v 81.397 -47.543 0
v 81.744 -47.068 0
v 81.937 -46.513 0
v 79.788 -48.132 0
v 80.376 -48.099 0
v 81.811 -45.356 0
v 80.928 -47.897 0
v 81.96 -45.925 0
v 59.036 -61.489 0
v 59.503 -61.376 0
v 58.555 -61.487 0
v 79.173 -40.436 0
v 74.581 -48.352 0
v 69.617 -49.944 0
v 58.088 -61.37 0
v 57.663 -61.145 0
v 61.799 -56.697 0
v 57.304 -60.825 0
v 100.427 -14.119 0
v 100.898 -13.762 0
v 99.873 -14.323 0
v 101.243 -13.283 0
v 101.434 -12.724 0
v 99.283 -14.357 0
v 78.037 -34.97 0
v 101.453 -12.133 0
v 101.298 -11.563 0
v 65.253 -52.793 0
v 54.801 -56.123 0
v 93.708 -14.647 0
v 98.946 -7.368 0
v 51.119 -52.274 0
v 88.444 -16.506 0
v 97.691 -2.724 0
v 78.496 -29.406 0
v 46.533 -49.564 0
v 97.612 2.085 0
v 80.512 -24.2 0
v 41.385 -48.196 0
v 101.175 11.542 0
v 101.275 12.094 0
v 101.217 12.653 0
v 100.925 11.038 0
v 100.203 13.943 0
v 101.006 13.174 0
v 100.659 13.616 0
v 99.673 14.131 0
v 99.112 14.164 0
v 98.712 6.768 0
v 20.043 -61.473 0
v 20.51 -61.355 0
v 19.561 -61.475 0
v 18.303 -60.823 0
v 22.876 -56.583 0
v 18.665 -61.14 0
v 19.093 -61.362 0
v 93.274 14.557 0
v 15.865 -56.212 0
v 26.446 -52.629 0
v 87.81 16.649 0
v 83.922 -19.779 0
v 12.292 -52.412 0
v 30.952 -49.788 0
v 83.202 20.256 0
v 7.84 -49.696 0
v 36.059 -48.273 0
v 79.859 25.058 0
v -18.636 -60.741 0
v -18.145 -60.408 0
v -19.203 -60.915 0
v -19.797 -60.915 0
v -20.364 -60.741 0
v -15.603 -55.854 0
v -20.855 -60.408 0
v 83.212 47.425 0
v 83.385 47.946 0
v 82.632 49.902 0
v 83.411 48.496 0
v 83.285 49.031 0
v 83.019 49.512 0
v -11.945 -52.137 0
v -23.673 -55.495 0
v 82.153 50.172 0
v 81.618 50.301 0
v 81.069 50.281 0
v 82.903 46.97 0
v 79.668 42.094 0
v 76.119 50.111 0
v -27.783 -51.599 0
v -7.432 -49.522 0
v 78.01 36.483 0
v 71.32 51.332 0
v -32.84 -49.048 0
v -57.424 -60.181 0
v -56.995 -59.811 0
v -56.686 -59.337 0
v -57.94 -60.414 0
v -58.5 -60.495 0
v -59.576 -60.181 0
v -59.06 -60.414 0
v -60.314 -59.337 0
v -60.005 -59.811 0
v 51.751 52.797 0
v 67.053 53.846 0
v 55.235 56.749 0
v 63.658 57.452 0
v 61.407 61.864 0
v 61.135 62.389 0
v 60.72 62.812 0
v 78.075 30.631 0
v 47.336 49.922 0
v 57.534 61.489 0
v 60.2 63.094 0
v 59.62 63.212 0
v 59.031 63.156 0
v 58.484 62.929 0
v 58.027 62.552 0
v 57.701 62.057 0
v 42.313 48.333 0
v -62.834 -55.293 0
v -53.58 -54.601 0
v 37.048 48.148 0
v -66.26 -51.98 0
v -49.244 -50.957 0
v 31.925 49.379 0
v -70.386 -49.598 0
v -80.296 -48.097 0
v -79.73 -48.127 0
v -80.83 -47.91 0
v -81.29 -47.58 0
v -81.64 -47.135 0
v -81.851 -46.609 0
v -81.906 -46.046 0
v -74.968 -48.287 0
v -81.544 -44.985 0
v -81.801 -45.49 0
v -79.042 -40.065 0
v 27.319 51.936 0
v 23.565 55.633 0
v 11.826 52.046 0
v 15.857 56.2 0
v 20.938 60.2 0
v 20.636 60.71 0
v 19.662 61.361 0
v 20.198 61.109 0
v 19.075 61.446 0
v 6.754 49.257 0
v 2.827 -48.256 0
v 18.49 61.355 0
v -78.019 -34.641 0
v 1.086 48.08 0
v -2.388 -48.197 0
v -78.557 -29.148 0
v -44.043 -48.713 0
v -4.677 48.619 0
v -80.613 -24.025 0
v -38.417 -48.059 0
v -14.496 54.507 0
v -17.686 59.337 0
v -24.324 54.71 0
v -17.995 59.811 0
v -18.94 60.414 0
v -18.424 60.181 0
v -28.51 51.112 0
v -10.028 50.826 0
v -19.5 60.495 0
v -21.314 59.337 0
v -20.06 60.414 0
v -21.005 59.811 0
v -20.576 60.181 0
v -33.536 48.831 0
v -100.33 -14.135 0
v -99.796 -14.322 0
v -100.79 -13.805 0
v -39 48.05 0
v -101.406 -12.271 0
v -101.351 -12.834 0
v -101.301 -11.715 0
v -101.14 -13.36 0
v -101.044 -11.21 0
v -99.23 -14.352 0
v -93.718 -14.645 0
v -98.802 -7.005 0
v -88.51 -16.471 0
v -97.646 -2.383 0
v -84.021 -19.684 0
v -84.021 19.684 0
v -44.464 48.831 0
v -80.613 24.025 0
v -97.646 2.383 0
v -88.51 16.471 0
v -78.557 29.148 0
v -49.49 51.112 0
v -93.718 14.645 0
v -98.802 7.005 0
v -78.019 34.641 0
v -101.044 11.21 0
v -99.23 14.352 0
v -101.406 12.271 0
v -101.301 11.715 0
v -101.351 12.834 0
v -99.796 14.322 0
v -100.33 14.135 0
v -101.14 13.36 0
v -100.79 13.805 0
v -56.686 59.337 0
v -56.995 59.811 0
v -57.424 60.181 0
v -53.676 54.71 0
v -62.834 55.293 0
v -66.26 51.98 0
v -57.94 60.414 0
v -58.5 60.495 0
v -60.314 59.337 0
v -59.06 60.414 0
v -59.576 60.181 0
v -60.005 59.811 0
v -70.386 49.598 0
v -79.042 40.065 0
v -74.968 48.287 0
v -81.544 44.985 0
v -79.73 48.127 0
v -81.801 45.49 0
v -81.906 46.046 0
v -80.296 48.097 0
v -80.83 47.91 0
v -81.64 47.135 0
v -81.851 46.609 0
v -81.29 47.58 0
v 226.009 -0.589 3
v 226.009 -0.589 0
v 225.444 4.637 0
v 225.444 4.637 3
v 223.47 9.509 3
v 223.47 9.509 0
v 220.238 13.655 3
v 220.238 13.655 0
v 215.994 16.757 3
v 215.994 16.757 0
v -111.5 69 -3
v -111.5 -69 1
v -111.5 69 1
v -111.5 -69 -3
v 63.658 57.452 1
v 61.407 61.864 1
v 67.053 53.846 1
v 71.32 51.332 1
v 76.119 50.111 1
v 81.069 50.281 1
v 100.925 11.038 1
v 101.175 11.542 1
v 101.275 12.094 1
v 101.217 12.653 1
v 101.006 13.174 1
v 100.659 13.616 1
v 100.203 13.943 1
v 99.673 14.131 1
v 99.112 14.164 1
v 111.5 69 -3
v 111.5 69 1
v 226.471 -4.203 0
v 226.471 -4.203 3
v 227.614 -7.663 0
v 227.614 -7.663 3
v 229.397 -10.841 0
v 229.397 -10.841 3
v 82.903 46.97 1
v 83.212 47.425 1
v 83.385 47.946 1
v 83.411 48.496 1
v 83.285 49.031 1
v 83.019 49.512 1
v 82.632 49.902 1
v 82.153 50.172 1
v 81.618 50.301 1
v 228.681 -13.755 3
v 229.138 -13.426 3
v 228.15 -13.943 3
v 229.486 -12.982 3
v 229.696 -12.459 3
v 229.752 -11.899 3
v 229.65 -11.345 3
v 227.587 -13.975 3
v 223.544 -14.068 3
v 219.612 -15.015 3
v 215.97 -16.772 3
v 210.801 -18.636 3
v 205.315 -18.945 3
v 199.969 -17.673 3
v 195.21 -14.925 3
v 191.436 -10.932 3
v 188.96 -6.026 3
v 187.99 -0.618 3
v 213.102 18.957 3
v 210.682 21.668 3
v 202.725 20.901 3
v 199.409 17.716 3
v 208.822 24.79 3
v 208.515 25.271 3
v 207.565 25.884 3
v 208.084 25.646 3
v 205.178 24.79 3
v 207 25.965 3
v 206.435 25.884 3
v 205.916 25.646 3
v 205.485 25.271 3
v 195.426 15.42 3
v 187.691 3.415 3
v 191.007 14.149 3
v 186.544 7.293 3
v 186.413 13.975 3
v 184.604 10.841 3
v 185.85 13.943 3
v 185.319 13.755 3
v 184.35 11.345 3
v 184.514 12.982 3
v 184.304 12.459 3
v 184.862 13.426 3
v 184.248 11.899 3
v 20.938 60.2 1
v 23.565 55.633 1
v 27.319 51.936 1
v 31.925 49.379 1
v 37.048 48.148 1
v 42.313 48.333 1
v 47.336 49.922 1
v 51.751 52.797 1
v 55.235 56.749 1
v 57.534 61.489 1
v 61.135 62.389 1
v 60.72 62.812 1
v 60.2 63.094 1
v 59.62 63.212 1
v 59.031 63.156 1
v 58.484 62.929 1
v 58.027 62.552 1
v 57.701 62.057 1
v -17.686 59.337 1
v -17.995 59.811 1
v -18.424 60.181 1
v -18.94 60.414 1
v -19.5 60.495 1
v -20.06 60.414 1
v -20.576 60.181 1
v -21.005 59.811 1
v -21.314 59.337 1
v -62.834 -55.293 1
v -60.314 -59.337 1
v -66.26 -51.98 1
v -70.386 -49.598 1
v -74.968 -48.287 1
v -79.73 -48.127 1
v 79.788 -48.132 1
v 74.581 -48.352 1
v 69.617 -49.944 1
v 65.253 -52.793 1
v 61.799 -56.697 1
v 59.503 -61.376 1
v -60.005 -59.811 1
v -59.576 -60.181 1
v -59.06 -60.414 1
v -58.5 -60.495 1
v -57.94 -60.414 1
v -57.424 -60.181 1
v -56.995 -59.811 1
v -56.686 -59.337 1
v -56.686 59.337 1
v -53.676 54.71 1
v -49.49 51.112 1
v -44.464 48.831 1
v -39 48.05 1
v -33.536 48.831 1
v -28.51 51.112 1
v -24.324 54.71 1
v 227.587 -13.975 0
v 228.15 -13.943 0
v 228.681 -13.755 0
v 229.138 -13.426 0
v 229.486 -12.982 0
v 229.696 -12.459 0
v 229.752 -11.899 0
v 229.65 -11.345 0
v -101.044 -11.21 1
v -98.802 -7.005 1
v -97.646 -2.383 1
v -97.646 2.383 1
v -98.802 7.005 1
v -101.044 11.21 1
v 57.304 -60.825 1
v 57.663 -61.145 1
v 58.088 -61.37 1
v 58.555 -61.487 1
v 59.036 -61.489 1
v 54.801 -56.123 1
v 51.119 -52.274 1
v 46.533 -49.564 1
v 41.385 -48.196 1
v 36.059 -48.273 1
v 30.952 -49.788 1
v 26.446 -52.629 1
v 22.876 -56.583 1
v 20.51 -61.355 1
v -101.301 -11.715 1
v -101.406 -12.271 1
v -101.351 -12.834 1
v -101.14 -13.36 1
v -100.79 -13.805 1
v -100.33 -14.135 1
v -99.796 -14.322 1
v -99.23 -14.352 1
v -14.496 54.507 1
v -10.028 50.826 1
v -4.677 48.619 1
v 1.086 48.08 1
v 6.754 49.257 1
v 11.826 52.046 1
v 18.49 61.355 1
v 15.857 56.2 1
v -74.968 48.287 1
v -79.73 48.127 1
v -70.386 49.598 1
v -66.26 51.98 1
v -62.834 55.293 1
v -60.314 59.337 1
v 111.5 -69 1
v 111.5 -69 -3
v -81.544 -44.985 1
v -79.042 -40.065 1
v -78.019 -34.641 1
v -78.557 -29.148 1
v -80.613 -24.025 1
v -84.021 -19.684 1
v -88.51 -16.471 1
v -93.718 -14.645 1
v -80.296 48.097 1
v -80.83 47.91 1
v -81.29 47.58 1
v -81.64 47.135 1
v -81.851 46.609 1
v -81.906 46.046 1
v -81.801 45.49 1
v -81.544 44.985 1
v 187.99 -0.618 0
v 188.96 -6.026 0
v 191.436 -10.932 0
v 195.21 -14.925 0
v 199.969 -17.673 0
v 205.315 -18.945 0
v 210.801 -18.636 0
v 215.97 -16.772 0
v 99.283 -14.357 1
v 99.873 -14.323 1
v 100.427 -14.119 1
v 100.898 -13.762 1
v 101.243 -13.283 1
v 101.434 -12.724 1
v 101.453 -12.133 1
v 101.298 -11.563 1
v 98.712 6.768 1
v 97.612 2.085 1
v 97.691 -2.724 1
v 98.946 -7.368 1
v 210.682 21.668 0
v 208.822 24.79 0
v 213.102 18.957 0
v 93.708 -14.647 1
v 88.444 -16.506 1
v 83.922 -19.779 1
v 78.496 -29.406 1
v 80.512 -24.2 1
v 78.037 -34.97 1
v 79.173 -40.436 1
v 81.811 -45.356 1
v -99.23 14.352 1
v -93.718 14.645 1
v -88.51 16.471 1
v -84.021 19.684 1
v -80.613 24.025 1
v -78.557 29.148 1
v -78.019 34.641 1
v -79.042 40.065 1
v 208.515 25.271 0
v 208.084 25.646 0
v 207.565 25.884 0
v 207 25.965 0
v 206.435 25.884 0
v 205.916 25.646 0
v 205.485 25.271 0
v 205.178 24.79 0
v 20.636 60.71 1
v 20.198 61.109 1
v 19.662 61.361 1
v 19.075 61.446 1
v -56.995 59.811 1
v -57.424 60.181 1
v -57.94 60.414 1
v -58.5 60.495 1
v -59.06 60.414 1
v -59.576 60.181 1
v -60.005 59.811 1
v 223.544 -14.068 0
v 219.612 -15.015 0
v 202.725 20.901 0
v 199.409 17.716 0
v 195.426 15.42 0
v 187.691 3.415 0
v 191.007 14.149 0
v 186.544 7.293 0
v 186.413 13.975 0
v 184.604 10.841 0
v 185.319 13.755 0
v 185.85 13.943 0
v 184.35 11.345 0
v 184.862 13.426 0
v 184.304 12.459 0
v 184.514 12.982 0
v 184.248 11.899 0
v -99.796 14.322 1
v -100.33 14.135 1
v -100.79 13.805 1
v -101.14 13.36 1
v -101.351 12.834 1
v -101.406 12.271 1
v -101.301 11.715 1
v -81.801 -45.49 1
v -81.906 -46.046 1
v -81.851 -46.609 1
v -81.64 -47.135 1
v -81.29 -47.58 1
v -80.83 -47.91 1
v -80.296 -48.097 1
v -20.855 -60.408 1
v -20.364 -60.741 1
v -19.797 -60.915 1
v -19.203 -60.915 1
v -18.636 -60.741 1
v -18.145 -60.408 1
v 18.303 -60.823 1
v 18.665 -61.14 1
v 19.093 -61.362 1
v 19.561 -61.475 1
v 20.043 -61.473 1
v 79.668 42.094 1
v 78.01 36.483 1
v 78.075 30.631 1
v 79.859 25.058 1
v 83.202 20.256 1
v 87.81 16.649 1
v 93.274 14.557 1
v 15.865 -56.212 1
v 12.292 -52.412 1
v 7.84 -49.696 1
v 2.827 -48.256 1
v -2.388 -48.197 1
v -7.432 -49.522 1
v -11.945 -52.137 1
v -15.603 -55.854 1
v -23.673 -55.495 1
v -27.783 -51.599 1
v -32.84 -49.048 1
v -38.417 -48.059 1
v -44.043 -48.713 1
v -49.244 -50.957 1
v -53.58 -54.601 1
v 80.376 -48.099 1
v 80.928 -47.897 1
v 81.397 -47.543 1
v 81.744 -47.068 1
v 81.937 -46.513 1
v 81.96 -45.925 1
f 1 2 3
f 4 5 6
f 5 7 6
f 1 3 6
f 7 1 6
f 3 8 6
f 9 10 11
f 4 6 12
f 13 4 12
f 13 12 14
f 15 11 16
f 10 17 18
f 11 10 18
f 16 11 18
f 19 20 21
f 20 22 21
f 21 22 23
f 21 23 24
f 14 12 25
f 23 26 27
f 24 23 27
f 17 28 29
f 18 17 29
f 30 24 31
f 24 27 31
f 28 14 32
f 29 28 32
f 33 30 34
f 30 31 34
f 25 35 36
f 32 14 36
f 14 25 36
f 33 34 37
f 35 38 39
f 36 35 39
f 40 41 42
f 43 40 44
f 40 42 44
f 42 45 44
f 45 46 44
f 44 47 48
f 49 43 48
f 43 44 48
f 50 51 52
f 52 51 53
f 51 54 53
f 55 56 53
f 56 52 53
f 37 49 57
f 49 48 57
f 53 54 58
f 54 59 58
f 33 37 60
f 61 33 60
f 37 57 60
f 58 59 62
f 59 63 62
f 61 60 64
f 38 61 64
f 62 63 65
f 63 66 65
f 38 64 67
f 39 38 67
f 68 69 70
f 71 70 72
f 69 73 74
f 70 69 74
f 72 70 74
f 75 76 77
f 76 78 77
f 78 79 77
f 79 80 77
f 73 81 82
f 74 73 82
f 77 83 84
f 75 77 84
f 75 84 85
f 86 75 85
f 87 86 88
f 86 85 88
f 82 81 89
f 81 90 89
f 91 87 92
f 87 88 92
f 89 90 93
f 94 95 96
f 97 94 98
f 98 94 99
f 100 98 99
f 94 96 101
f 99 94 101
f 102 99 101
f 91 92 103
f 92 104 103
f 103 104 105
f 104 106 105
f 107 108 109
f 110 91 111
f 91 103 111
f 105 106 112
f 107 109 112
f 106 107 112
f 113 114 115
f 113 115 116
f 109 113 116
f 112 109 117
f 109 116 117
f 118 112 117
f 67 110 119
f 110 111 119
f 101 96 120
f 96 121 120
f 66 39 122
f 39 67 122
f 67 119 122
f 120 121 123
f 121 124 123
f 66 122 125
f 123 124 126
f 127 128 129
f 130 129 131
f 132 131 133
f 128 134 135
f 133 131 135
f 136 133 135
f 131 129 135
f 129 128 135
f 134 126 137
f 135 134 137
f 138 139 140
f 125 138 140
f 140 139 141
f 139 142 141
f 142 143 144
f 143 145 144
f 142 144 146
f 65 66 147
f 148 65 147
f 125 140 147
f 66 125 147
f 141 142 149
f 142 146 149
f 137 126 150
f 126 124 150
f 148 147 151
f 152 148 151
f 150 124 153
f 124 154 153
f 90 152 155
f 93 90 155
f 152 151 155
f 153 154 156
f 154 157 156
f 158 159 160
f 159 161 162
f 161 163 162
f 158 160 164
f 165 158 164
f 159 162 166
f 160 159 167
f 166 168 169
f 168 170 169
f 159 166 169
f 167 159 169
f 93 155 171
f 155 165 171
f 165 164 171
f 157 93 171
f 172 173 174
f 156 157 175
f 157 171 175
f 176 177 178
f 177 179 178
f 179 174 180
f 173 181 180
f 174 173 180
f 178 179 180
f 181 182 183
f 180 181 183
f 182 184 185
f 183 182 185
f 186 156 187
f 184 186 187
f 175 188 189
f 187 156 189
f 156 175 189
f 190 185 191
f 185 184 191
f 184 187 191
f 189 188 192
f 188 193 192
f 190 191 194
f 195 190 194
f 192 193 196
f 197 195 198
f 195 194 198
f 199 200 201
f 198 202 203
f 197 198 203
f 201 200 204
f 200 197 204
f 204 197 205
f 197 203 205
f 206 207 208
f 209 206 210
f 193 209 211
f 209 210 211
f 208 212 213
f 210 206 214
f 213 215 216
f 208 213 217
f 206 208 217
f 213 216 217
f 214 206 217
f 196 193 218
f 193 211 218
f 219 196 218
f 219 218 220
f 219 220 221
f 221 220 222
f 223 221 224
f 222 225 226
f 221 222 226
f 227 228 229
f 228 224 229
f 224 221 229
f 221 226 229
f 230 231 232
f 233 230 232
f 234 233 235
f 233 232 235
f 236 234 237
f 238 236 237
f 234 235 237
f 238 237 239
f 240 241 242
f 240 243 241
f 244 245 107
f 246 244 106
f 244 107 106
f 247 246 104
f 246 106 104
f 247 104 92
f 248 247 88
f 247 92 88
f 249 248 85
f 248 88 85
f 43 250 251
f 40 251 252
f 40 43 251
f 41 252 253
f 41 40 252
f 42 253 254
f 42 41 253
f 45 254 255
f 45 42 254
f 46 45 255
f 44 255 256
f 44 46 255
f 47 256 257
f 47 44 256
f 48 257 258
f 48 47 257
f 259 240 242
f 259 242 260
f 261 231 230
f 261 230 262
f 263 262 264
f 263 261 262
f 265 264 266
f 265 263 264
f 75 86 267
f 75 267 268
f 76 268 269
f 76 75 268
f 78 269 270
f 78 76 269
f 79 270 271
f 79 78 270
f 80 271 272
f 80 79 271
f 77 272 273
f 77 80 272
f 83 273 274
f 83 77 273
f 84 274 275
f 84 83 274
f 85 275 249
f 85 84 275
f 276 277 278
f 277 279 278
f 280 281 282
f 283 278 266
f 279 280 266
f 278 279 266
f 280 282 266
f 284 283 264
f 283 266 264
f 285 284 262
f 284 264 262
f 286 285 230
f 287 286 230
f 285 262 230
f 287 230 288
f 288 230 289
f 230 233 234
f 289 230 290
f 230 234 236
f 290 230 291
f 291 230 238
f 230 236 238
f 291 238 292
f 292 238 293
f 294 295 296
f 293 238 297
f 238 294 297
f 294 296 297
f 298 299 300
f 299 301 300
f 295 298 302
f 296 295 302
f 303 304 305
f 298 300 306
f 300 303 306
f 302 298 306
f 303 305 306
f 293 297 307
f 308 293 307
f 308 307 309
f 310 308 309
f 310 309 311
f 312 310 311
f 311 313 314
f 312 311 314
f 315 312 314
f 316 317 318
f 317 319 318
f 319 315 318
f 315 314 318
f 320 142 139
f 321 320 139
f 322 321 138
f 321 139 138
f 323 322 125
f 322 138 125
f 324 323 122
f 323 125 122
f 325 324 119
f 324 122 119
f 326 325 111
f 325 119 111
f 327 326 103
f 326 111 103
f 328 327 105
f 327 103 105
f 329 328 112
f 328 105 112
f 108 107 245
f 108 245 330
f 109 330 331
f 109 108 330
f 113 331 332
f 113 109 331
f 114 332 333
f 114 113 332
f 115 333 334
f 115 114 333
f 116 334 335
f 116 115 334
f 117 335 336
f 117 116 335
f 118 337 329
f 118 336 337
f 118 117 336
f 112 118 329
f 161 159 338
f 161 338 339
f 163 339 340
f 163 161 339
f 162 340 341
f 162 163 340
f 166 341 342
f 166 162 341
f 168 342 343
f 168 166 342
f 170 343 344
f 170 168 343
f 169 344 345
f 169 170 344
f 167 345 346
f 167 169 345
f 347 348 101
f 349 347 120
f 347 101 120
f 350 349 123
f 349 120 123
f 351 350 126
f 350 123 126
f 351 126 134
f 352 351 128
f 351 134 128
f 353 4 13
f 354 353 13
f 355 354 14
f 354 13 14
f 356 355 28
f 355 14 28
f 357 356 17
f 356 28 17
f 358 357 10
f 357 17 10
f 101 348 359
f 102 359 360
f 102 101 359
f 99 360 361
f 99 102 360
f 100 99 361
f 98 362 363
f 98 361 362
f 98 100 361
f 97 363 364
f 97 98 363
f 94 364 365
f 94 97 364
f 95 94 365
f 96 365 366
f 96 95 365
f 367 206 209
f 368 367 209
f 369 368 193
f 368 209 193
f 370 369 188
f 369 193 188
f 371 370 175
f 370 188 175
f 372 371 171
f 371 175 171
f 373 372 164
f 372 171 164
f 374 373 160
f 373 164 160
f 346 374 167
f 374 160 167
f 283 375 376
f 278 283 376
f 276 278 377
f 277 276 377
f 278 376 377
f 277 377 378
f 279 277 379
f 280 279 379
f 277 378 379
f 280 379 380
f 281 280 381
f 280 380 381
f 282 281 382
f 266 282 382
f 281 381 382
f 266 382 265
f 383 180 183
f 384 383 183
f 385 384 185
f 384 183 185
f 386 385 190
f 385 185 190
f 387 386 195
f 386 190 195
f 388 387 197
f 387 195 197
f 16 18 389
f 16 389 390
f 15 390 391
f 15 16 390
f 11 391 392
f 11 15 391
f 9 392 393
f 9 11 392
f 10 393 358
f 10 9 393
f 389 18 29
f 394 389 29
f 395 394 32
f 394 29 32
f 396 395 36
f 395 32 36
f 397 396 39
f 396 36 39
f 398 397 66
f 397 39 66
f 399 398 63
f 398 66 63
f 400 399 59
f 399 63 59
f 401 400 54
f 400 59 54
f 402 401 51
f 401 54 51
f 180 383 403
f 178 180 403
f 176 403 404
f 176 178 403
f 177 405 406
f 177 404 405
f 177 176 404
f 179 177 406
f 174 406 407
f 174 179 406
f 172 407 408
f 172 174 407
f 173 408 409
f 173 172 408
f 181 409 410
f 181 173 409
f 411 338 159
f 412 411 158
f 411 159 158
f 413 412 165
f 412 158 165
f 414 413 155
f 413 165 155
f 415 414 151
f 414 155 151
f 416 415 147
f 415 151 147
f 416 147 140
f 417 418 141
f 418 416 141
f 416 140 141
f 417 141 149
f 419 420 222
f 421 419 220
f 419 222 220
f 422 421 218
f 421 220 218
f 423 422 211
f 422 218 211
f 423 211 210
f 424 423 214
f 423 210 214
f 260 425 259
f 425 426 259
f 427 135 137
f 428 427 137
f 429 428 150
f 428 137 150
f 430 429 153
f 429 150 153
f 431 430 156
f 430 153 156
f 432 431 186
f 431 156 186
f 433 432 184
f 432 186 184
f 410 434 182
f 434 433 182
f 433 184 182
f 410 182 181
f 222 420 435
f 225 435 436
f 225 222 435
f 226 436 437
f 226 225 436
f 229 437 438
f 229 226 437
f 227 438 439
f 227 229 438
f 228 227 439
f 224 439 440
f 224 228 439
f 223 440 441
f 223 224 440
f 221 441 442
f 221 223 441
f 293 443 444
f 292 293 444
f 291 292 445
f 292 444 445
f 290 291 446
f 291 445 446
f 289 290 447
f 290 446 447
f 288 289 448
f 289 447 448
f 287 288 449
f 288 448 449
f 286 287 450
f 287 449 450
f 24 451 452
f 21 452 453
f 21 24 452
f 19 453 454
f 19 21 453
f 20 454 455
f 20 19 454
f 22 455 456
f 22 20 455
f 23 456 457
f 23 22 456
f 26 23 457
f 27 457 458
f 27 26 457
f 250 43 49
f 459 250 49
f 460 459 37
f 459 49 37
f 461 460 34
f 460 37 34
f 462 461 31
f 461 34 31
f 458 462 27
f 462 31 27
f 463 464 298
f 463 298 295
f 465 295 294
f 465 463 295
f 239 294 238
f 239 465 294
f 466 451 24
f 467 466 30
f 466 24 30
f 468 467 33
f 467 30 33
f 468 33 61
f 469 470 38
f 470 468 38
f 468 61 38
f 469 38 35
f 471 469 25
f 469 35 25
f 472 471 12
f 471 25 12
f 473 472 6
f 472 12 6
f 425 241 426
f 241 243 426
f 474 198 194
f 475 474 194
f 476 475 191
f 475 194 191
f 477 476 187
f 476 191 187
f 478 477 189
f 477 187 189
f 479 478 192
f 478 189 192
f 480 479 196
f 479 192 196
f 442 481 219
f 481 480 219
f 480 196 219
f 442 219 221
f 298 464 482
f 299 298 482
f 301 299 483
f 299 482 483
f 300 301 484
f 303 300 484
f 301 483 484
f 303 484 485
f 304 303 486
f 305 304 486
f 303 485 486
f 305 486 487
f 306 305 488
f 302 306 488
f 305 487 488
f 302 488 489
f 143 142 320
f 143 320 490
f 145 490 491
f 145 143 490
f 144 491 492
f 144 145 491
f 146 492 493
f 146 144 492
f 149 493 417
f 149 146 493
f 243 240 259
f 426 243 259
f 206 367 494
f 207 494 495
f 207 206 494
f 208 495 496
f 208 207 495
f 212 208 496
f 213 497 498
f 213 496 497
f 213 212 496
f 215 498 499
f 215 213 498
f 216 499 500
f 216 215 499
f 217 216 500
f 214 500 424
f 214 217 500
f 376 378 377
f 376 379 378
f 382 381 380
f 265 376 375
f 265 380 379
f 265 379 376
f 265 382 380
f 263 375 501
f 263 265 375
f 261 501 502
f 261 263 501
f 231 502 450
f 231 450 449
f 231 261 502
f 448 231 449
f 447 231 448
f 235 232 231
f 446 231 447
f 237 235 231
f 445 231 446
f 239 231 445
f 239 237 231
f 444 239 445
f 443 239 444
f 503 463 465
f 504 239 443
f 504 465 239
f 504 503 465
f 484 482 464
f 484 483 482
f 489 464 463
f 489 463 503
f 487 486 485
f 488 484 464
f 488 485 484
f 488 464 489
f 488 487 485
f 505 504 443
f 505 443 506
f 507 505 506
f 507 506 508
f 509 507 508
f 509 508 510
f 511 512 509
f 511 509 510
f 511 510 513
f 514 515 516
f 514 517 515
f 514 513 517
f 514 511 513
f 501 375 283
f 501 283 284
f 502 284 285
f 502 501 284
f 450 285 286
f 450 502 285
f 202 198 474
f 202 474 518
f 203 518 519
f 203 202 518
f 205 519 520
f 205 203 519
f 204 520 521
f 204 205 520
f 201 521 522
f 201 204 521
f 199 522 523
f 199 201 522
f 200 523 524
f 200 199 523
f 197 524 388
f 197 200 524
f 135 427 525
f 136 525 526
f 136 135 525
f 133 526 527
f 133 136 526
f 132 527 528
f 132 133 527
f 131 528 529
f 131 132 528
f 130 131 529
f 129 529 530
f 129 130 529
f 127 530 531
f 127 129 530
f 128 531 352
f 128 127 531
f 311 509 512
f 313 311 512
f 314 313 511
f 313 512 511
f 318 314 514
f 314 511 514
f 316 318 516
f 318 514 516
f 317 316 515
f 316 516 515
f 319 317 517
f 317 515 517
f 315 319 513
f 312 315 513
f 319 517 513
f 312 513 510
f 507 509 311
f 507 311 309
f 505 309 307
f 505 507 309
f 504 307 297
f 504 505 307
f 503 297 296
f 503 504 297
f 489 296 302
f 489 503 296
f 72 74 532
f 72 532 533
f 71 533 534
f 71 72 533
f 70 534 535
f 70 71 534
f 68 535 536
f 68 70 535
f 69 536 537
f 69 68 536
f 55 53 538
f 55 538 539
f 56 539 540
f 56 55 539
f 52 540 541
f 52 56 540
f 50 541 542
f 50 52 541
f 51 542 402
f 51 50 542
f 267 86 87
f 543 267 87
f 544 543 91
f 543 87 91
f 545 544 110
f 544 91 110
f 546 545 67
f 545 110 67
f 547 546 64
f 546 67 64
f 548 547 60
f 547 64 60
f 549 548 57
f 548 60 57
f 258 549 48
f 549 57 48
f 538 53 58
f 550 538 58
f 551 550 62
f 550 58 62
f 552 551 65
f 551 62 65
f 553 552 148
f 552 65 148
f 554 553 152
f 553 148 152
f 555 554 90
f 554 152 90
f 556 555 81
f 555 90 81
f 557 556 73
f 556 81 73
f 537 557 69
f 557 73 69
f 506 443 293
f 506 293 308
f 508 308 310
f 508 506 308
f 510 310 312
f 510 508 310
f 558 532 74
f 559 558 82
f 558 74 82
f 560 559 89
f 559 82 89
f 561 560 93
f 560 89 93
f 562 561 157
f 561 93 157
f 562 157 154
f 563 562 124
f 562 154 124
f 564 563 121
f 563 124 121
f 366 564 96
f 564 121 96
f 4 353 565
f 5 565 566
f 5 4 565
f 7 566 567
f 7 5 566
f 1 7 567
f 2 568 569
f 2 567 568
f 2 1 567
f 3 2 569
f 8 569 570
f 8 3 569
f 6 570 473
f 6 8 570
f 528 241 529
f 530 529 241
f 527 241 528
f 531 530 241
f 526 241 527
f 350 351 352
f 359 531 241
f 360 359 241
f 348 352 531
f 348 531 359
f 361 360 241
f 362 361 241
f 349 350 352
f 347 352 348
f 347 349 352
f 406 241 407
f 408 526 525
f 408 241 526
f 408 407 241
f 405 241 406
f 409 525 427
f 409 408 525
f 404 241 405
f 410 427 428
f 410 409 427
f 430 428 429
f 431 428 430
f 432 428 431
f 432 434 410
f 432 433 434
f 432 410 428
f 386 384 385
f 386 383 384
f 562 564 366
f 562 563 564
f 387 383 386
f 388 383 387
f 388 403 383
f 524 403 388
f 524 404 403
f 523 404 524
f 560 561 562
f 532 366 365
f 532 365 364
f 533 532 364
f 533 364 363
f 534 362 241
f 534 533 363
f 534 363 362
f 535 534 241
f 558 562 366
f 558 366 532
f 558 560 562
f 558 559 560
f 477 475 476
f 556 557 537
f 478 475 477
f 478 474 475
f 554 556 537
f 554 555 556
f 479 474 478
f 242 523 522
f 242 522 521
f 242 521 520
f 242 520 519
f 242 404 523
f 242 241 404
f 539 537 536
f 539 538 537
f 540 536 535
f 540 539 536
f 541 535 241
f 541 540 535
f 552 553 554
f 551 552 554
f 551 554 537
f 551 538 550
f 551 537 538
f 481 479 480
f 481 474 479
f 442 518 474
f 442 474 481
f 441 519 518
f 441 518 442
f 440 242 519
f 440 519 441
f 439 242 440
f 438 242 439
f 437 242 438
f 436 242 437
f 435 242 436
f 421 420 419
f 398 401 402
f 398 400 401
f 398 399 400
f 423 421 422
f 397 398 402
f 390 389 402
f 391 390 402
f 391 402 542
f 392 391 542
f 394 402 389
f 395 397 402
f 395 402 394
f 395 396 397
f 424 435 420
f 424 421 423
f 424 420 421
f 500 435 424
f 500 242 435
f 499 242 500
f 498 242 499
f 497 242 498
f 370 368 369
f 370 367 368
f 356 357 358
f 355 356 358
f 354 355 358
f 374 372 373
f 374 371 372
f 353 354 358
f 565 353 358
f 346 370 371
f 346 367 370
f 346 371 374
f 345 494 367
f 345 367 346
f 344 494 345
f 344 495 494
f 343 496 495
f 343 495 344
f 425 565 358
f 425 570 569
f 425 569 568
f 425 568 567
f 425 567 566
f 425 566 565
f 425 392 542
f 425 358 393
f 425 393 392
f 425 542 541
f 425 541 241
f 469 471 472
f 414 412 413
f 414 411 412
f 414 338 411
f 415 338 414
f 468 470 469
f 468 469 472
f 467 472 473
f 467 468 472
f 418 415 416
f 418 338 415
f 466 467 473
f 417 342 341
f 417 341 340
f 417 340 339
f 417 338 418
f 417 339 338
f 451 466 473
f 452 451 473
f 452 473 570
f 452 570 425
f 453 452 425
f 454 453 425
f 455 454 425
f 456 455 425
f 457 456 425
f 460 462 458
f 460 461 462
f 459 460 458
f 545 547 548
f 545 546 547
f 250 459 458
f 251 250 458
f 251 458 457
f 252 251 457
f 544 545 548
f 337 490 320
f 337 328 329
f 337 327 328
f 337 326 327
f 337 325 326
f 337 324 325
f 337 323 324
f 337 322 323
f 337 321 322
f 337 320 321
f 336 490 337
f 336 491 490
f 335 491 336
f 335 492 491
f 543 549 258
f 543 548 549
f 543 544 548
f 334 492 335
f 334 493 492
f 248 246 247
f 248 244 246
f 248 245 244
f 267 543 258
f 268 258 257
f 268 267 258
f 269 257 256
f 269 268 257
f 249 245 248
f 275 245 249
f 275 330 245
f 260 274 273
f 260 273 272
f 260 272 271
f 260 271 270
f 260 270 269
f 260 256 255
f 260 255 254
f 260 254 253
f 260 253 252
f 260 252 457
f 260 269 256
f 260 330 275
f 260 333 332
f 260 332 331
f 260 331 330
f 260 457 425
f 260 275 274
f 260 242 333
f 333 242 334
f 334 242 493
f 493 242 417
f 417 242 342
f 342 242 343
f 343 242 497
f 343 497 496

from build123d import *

# Parameters (mm, degrees)
PAD001_DEPTH         = 3
SKETCH004_W          = 769.720642
SKETCH004_H          = 484.196625
SKETCH004_W_2        = 86.21834
SKETCH004_H_2        = 85.329529
POCKET001_DEPTH      = 100
POCKET001_DEPTH_BACK = -100
SKETCH002_W          = 223
SKETCH002_H          = 138
PAD_DEPTH            = 3
PAD_DEPTH_BACK       = -1
POCKET_DEPTH         = 3


with BuildPart() as pieces:
    # Sketch003 → Pad001 (new body)
    with BuildSketch(Plane.XY):
        with BuildLine():
            ThreePointArc((-205.226021, 141.050401), (-197.53634, 132.633448), (-186.413146, 130.133278))
            ThreePointArc((-184.604126, 126.998191), (-184.513671, 129.139853), (-186.413146, 130.133278))
            ThreePointArc((-184.604126, 126.998191), (-188, 116.15736), (-184.603475, 105.316733))
            ThreePointArc((-186.413076, 102.182578), (-184.513939, 103.175545), (-184.603475, 105.316733))
            ThreePointArc((-186.413076, 102.182578), (-197.500014, 99.70344), (-205.190465, 91.341426))
            ThreePointArc((-208.809364, 91.341063), (-206.999799, 90.193237), (-205.190465, 91.341426))
            ThreePointArc((-208.809364, 91.341063), (-216.499836, 99.703353), (-227.586977, 102.182573))
            ThreePointArc((-229.396171, 105.317242), (-229.48623, 103.175836), (-227.586977, 102.182573))
            ThreePointArc((-229.396171, 105.317242), (-226, 116.158224), (-229.396506, 126.999102))
            ThreePointArc((-227.586983, 130.133289), (-229.486084, 129.140277), (-229.396506, 126.999102))
            ThreePointArc((-227.586983, 130.133289), (-216.484349, 132.62146), (-208.794156, 141.007186))
            ThreePointArc((-205.226021, 141.050401), (-207.023366, 142.125033), (-208.794156, 141.007186))
        make_face()
        with BuildLine():
            ThreePointArc((208.900742, -91.192405), (212.086998, -95.848377), (216.5, -99.363448))
            ThreePointArc((197.5, -99.363448), (207, -134.817931), (216.5, -99.363448))
            ThreePointArc((197.5, -99.363448), (201.953007, -95.805228), (205.150235, -91.086338))
            ThreePointArc((208.900742, -91.192405), (207.062429, -89.833156), (205.150235, -91.086338))
        make_face()
        with BuildLine():
            ThreePointArc((-67.190475, 140.634458), (-59.500032, 132.272432), (-48.413093, 129.793282))
            ThreePointArc((-46.60383, 126.658618), (-46.513788, 128.800055), (-48.413093, 129.793282))
            ThreePointArc((-46.60383, 126.658618), (-50, 115.817636), (-46.603494, 104.97676))
            ThreePointArc((-48.413017, 101.842573), (-46.513916, 102.835584), (-46.603494, 104.97676))
            ThreePointArc((-48.413017, 101.842573), (-54.146025, 101.451092), (-59.499796, 99.363566))
            ThreePointArc((-78.499746, 99.363301), (-68.999736, 96.817931), (-59.499796, 99.363566))
            ThreePointArc((-78.499746, 99.363301), (-83.85368, 101.451026), (-89.586907, 101.842579))
            ThreePointArc((-91.396506, 104.97676), (-91.486065, 102.835551), (-89.586907, 101.842579))
            ThreePointArc((-91.396506, 104.97676), (-88, 115.817641), (-91.396176, 126.658626))
            ThreePointArc((-89.586977, 129.793288), (-91.486228, 128.800029), (-91.396176, 126.658626))
            ThreePointArc((-89.586977, 129.793288), (-78.499829, 132.272512), (-70.809358, 140.634812))
            ThreePointArc((-67.190475, 140.634458), (-68.999804, 141.782624), (-70.809358, 140.634812))
        make_face()
        with BuildLine():
            ThreePointArc((70.809356, 140.634817), (78.499826, 132.272514), (89.586974, 129.793288))
            ThreePointArc((91.396502, 126.659096), (91.486084, 128.800278), (89.586974, 129.793288))
            ThreePointArc((91.396502, 126.659096), (88.868997, 121.498312), (88, 115.817924))
            ThreePointArc((59.500281, 99.363286), (78.500138, 99.363527), (88, 115.817924))
            ThreePointArc((59.500281, 99.363286), (54.146298, 101.451031), (48.413016, 101.842573))
            ThreePointArc((46.60381, 104.977215), (46.513777, 102.835825), (48.413016, 101.842573))
            ThreePointArc((46.60381, 104.977215), (50, 115.818206), (46.603496, 126.659098))
            ThreePointArc((48.413024, 129.793288), (46.513917, 128.800279), (46.603496, 126.659098))
            ThreePointArc((48.413024, 129.793288), (59.500172, 132.272513), (67.190643, 140.634813))
            ThreePointArc((70.809356, 140.634817), (68.999998, 141.782624), (67.190643, 140.634813))
        make_face()
        with BuildLine():
            ThreePointArc((208.809525, 140.634456), (216.499968, 132.272432), (227.586905, 129.793282))
            ThreePointArc((229.396503, 126.659097), (229.486066, 128.800309), (227.586905, 129.793282))
            ThreePointArc((229.396503, 126.659097), (226.868998, 121.498314), (226, 115.817926))
            ThreePointArc((188, 115.817931), (206.999998, 96.817931), (226, 115.817926))
            ThreePointArc((188, 115.817931), (187.131001, 121.498318), (184.603495, 126.6591))
            ThreePointArc((186.413023, 129.793288), (184.513917, 128.800279), (184.603495, 126.6591))
            ThreePointArc((186.413023, 129.793288), (197.500171, 132.272512), (205.190642, 140.634812))
            ThreePointArc((208.809525, 140.634456), (207.000197, 141.782624), (205.190642, 140.634812))
        make_face()
        with BuildLine():
            ThreePointArc((-227.579289, 14.314715), (-216.496489, 16.79651), (-208.809358, 25.156881))
            ThreePointArc((-205.190852, 25.157326), (-207.000246, 26.304694), (-208.809358, 25.156881))
            ThreePointArc((-205.190852, 25.157326), (-201.985159, 20.387577), (-197.5, 16.794483))
            ThreePointArc((-188, 0.339994), (-190.545516, 9.839997), (-197.5, 16.794483))
            ThreePointArc((-188, 0.339994), (-187.130999, -5.340395), (-184.603489, -10.501177))
            ThreePointArc((-186.41309, -13.635352), (-184.513936, -12.642381), (-184.603489, -10.501177))
            ThreePointArc((-186.41309, -13.635352), (-197.500044, -16.114508), (-205.190488, -24.476555))
            ThreePointArc((-208.80952, -24.476537), (-207.00001, -25.624693), (-205.190488, -24.476555))
            ThreePointArc((-208.80952, -24.476537), (-212.014877, -19.707537), (-216.499338, -16.114865))
            ThreePointArc((-226, 0.339999), (-223.454291, -9.160332), (-216.499338, -16.114865))
            ThreePointArc((-226, 0.339999), (-226.867774, 6.016476), (-229.39183, 11.174437))
            ThreePointArc((-227.579289, 14.314715), (-229.48624, 13.32216), (-229.39183, 11.174437))
        make_face()
        with BuildLine():
            ThreePointArc((-89.596783, 13.976182), (-78.521543, 16.442064), (-70.826555, 24.780449))
            ThreePointArc((-67.173441, 24.78044), (-68.999995, 25.965773), (-70.826555, 24.780449))
            ThreePointArc((-67.173441, 24.78044), (-59.482714, 16.444515), (-48.413017, 13.975358))
            ThreePointArc((-46.603598, 10.84102), (-46.51387, 12.982267), (-48.413017, 13.975358))
            ThreePointArc((-46.603598, 10.84102), (-49.131093, 5.680093), (-50, -0.000436))
            ThreePointArc((-59.499846, -16.454394), (-52.545582, -9.500112), (-50, -0.000436))
            ThreePointArc((-59.499846, -16.454394), (-63.984801, -20.047187), (-67.190476, -24.816529))
            ThreePointArc((-70.809524, -24.816529), (-69, -25.964693), (-67.190476, -24.816529))
            ThreePointArc((-70.809524, -24.816529), (-74.015033, -20.047368), (-78.499728, -16.45464))
            ThreePointArc((-88, 0), (-85.454404, -9.500136), (-78.499728, -16.45464))
            ThreePointArc((-88, 0), (-88.878611, 5.710976), (-91.433184, 10.893771))
            ThreePointArc((-89.596783, 13.976182), (-91.473664, 13.006128), (-91.433184, 10.893771))
        make_face()
        with BuildLine():
            ThreePointArc((59.5, 16.454483), (63.975624, 20.037216), (67.178839, 24.791855))
            ThreePointArc((70.826633, 24.780284), (69.006477, 25.965474), (67.178839, 24.791855))
            ThreePointArc((70.826633, 24.780284), (74.0336, 20.027209), (78.51249, 16.447278))
            ThreePointArc((88.000005, 0.014419), (85.454492, 9.500005), (78.51249, 16.447278))
            ThreePointArc((88.000005, 0.014419), (88.866818, -5.673421), (91.396403, -10.841022))
            ThreePointArc((89.586961, -13.975356), (91.486124, -12.982278), (91.396403, -10.841022))
            ThreePointArc((89.586961, -13.975356), (83.889969, -14.358827), (78.564163, -16.417604))
            ThreePointArc((59.564019, -16.491611), (69.074006, -19.000144), (78.564163, -16.417604))
            ThreePointArc((59.564019, -16.491611), (54.182252, -14.374976), (48.413035, -13.975357))
            ThreePointArc((46.603492, -10.841174), (46.513921, -12.982356), (48.413035, -13.975357))
            ThreePointArc((46.603492, -10.841174), (49.131, -5.68039), (50, 0))
            ThreePointArc((59.5, 16.454483), (52.545517, 9.5), (50, 0))
        make_face()
        with BuildLine():
            ThreePointArc((186.41303, 13.975357), (197.487284, 16.447148), (205.177946, 24.789964))
            ThreePointArc((208.822053, 24.789966), (206.999999, 25.965271), (205.177946, 24.789964))
            ThreePointArc((208.822053, 24.789966), (211.827202, 20.254645), (215.994445, 16.756911))
            ThreePointArc((226.009133, -0.589038), (223.470294, 9.509128), (215.994445, 16.756911))
            ThreePointArc((226.009133, -0.589038), (226.95924, -5.960787), (229.396505, -10.841169))
            ThreePointArc((227.586987, -13.975358), (229.486086, -12.982344), (229.396505, -10.841169))
            ThreePointArc((227.586987, -13.975358), (221.552947, -14.436724), (215.970048, -16.772049))
            ThreePointArc((187.989955, -0.617735), (197.489961, -16.471871), (215.970048, -16.772049))
            ThreePointArc((187.989955, -0.617735), (187.220973, 5.384808), (184.603552, 10.841086))
            ThreePointArc((186.41303, 13.975357), (184.513893, 12.982308), (184.603552, 10.841086))
        make_face()
        with BuildLine():
            ThreePointArc((-184.807647, -104.936665), (-187.184407, -109.970903), (-188, -115.477931))
            ThreePointArc((-226, -115.477929), (-207.000001, -134.477931), (-188, -115.477931))
            ThreePointArc((-226, -115.477929), (-226.869031, -109.797441), (-229.396626, -104.636587))
            ThreePointArc((-227.586917, -101.502578), (-229.486015, -102.495464), (-229.396626, -104.636587))
            ThreePointArc((-227.586917, -101.502578), (-221.853828, -101.11106), (-216.5, -99.023448))
            ThreePointArc((-197.500001, -99.023448), (-207, -96.477931), (-216.5, -99.023448))
            ThreePointArc((-197.500001, -99.023448), (-192.286311, -101.079166), (-186.699693, -101.524418))
            ThreePointArc((-184.807647, -104.936665), (-184.389947, -102.474375), (-186.699693, -101.524418))
        make_face()
        with BuildLine():
            ThreePointArc((-78.499945, -99.363416), (-74.015619, -95.771201), (-70.810155, -91.002743))
            ThreePointArc((-67.193838, -90.994257), (-69.004684, -89.853222), (-70.810155, -91.002743))
            ThreePointArc((-67.193838, -90.994257), (-63.987509, -95.767798), (-59.499939, -99.363483))
            ThreePointArc((-59.500001, -132.272414), (-50, -115.817966), (-59.499939, -99.363483))
            ThreePointArc((-59.500001, -132.272414), (-63.984832, -135.865152), (-67.19044, -140.634382))
            ThreePointArc((-70.809522, -140.634463), (-68.999956, -141.782624), (-67.19044, -140.634382))
            ThreePointArc((-70.809522, -140.634463), (-74.01514, -135.865182), (-78.500005, -132.272411))
            ThreePointArc((-78.499945, -99.363416), (-88, -115.817896), (-78.500005, -132.272411))
        make_face()
        with BuildLine():
            ThreePointArc((70.809505, -91.001361), (78.49998, -99.363437), (89.586983, -101.842573))
            ThreePointArc((91.396507, -104.976759), (91.486084, -102.835583), (89.586983, -101.842573))
            ThreePointArc((91.396507, -104.976759), (88.868995, -110.137557), (88, -115.817962))
            ThreePointArc((59.499973, -99.363464), (59.5, -132.272413), (88, -115.817962))
            ThreePointArc((59.499973, -99.363464), (63.98487, -95.770668), (67.190502, -91.001348))
            ThreePointArc((70.809505, -91.001361), (69.000007, -89.853237), (67.190502, -91.001348))
        make_face()
    extrude(amount=PAD001_DEPTH)

    # Sketch004 → Pocket001 (cut, two sides)
    with BuildSketch(Plane.XY) as pocket001_sk:
        with Locations((-6.957947, 15.610642)):
            Rectangle(SKETCH004_W, SKETCH004_H)
        with Locations((212.1809, 1.74183)):
            Rectangle(SKETCH004_W_2, SKETCH004_H_2, mode=Mode.SUBTRACT)
    extrude(amount=-POCKET001_DEPTH, mode=Mode.SUBTRACT)
    extrude(pocket001_sk.sketch, amount=-POCKET001_DEPTH_BACK, mode=Mode.SUBTRACT)


with BuildPart() as board:
    # Sketch002 → Pad (new body, two sides)
    with BuildSketch(Plane.XY) as pad_sk:
        Rectangle(SKETCH002_W, SKETCH002_H)
    extrude(amount=-PAD_DEPTH)
    extrude(pad_sk.sketch, amount=-PAD_DEPTH_BACK)

    # Sketch → Pocket (cut)
    with BuildSketch(Plane.XY):
        with BuildLine():
            ThreePointArc((-101.04429, -11.210054), (-97.5, 0), (-101.04429, 11.210054))
            ThreePointArc((-99.230336, 14.351913), (-101.139857, 13.359803), (-101.04429, 11.210054))
            ThreePointArc((-99.230336, 14.351913), (-80.612505, 24.024991), (-81.54429, 44.985044))
            ThreePointArc((-79.730336, 48.126904), (-81.639857, 47.134794), (-81.54429, 44.985044))
            ThreePointArc((-79.730336, 48.126904), (-68.25, 50.662486), (-60.313953, 59.336958))
            ThreePointArc((-56.686047, 59.336958), (-58.5, 60.494596), (-60.313953, 59.336958))
            ThreePointArc((-56.686047, 59.336958), (-39, 48.049981), (-21.313953, 59.336958))
            ThreePointArc((-17.686047, 59.336958), (-19.5, 60.494596), (-21.313953, 59.336958))
            ThreePointArc((-17.686047, 59.336958), (1.086297, 48.080262), (18.489909, 61.355365))
            ThreePointArc((20.938216, 60.200018), (19.939256, 61.254901), (18.489909, 61.355365))
            ThreePointArc((20.938216, 60.200018), (39.686644, 48.062074), (57.534294, 61.489457))
            ThreePointArc((61.407371, 61.863545), (59.323115, 63.205883), (57.534294, 61.489457))
            ThreePointArc((61.407371, 61.863545), (69.09703, 52.437469), (81.069066, 50.280594))
            ThreePointArc((82.902685, 46.970282), (83.168551, 49.280535), (81.069066, 50.280594))
            ThreePointArc((82.902685, 46.970282), (79.858651, 25.058334), (99.112471, 14.16384))
            ThreePointArc((100.925073, 11.03842), (101.006459, 13.173944), (99.112471, 14.16384))
            ThreePointArc((100.925073, 11.03842), (97.502659, -0.322002), (101.298343, -11.563216))
            ThreePointArc((99.283231, -14.356698), (101.088147, -13.535142), (101.298343, -11.563216))
            ThreePointArc((99.283231, -14.356698), (80.512387, -24.200494), (81.811493, -45.356043))
            ThreePointArc((79.788374, -48.132162), (81.588126, -47.318504), (81.811493, -45.356043))
            ThreePointArc((79.788374, -48.132162), (67.339536, -51.221953), (59.503094, -61.376289))
            ThreePointArc((57.303847, -60.82546), (58.317881, -61.442601), (59.503094, -61.376289))
            ThreePointArc((57.303847, -60.82546), (38.719209, -48.052003), (20.510104, -61.355327))
            ThreePointArc((18.302884, -60.822841), (19.323606, -61.432667), (20.510104, -61.355327))
            ThreePointArc((18.302884, -60.822841), (0.22172, -48.051242), (-18.145183, -60.408391))
            ThreePointArc((-20.854817, -60.408391), (-19.5, -60.937176), (-18.145183, -60.408391))
            ThreePointArc((-20.854817, -60.408391), (-38.417167, -48.058694), (-56.686047, -59.336958))
            ThreePointArc((-60.313953, -59.336958), (-58.5, -60.494596), (-56.686047, -59.336958))
            ThreePointArc((-60.313953, -59.336958), (-68.25, -50.662486), (-79.730336, -48.126904))
            ThreePointArc((-81.54429, -44.985044), (-81.639857, -47.134794), (-79.730336, -48.126904))
            ThreePointArc((-81.54429, -44.985044), (-80.612505, -24.024991), (-99.230336, -14.351913))
            ThreePointArc((-101.04429, -11.210054), (-101.139857, -13.359803), (-99.230336, -14.351913))
        make_face()
    extrude(amount=POCKET_DEPTH, mode=Mode.SUBTRACT)


solid = Compound([pieces.part, board.part])
